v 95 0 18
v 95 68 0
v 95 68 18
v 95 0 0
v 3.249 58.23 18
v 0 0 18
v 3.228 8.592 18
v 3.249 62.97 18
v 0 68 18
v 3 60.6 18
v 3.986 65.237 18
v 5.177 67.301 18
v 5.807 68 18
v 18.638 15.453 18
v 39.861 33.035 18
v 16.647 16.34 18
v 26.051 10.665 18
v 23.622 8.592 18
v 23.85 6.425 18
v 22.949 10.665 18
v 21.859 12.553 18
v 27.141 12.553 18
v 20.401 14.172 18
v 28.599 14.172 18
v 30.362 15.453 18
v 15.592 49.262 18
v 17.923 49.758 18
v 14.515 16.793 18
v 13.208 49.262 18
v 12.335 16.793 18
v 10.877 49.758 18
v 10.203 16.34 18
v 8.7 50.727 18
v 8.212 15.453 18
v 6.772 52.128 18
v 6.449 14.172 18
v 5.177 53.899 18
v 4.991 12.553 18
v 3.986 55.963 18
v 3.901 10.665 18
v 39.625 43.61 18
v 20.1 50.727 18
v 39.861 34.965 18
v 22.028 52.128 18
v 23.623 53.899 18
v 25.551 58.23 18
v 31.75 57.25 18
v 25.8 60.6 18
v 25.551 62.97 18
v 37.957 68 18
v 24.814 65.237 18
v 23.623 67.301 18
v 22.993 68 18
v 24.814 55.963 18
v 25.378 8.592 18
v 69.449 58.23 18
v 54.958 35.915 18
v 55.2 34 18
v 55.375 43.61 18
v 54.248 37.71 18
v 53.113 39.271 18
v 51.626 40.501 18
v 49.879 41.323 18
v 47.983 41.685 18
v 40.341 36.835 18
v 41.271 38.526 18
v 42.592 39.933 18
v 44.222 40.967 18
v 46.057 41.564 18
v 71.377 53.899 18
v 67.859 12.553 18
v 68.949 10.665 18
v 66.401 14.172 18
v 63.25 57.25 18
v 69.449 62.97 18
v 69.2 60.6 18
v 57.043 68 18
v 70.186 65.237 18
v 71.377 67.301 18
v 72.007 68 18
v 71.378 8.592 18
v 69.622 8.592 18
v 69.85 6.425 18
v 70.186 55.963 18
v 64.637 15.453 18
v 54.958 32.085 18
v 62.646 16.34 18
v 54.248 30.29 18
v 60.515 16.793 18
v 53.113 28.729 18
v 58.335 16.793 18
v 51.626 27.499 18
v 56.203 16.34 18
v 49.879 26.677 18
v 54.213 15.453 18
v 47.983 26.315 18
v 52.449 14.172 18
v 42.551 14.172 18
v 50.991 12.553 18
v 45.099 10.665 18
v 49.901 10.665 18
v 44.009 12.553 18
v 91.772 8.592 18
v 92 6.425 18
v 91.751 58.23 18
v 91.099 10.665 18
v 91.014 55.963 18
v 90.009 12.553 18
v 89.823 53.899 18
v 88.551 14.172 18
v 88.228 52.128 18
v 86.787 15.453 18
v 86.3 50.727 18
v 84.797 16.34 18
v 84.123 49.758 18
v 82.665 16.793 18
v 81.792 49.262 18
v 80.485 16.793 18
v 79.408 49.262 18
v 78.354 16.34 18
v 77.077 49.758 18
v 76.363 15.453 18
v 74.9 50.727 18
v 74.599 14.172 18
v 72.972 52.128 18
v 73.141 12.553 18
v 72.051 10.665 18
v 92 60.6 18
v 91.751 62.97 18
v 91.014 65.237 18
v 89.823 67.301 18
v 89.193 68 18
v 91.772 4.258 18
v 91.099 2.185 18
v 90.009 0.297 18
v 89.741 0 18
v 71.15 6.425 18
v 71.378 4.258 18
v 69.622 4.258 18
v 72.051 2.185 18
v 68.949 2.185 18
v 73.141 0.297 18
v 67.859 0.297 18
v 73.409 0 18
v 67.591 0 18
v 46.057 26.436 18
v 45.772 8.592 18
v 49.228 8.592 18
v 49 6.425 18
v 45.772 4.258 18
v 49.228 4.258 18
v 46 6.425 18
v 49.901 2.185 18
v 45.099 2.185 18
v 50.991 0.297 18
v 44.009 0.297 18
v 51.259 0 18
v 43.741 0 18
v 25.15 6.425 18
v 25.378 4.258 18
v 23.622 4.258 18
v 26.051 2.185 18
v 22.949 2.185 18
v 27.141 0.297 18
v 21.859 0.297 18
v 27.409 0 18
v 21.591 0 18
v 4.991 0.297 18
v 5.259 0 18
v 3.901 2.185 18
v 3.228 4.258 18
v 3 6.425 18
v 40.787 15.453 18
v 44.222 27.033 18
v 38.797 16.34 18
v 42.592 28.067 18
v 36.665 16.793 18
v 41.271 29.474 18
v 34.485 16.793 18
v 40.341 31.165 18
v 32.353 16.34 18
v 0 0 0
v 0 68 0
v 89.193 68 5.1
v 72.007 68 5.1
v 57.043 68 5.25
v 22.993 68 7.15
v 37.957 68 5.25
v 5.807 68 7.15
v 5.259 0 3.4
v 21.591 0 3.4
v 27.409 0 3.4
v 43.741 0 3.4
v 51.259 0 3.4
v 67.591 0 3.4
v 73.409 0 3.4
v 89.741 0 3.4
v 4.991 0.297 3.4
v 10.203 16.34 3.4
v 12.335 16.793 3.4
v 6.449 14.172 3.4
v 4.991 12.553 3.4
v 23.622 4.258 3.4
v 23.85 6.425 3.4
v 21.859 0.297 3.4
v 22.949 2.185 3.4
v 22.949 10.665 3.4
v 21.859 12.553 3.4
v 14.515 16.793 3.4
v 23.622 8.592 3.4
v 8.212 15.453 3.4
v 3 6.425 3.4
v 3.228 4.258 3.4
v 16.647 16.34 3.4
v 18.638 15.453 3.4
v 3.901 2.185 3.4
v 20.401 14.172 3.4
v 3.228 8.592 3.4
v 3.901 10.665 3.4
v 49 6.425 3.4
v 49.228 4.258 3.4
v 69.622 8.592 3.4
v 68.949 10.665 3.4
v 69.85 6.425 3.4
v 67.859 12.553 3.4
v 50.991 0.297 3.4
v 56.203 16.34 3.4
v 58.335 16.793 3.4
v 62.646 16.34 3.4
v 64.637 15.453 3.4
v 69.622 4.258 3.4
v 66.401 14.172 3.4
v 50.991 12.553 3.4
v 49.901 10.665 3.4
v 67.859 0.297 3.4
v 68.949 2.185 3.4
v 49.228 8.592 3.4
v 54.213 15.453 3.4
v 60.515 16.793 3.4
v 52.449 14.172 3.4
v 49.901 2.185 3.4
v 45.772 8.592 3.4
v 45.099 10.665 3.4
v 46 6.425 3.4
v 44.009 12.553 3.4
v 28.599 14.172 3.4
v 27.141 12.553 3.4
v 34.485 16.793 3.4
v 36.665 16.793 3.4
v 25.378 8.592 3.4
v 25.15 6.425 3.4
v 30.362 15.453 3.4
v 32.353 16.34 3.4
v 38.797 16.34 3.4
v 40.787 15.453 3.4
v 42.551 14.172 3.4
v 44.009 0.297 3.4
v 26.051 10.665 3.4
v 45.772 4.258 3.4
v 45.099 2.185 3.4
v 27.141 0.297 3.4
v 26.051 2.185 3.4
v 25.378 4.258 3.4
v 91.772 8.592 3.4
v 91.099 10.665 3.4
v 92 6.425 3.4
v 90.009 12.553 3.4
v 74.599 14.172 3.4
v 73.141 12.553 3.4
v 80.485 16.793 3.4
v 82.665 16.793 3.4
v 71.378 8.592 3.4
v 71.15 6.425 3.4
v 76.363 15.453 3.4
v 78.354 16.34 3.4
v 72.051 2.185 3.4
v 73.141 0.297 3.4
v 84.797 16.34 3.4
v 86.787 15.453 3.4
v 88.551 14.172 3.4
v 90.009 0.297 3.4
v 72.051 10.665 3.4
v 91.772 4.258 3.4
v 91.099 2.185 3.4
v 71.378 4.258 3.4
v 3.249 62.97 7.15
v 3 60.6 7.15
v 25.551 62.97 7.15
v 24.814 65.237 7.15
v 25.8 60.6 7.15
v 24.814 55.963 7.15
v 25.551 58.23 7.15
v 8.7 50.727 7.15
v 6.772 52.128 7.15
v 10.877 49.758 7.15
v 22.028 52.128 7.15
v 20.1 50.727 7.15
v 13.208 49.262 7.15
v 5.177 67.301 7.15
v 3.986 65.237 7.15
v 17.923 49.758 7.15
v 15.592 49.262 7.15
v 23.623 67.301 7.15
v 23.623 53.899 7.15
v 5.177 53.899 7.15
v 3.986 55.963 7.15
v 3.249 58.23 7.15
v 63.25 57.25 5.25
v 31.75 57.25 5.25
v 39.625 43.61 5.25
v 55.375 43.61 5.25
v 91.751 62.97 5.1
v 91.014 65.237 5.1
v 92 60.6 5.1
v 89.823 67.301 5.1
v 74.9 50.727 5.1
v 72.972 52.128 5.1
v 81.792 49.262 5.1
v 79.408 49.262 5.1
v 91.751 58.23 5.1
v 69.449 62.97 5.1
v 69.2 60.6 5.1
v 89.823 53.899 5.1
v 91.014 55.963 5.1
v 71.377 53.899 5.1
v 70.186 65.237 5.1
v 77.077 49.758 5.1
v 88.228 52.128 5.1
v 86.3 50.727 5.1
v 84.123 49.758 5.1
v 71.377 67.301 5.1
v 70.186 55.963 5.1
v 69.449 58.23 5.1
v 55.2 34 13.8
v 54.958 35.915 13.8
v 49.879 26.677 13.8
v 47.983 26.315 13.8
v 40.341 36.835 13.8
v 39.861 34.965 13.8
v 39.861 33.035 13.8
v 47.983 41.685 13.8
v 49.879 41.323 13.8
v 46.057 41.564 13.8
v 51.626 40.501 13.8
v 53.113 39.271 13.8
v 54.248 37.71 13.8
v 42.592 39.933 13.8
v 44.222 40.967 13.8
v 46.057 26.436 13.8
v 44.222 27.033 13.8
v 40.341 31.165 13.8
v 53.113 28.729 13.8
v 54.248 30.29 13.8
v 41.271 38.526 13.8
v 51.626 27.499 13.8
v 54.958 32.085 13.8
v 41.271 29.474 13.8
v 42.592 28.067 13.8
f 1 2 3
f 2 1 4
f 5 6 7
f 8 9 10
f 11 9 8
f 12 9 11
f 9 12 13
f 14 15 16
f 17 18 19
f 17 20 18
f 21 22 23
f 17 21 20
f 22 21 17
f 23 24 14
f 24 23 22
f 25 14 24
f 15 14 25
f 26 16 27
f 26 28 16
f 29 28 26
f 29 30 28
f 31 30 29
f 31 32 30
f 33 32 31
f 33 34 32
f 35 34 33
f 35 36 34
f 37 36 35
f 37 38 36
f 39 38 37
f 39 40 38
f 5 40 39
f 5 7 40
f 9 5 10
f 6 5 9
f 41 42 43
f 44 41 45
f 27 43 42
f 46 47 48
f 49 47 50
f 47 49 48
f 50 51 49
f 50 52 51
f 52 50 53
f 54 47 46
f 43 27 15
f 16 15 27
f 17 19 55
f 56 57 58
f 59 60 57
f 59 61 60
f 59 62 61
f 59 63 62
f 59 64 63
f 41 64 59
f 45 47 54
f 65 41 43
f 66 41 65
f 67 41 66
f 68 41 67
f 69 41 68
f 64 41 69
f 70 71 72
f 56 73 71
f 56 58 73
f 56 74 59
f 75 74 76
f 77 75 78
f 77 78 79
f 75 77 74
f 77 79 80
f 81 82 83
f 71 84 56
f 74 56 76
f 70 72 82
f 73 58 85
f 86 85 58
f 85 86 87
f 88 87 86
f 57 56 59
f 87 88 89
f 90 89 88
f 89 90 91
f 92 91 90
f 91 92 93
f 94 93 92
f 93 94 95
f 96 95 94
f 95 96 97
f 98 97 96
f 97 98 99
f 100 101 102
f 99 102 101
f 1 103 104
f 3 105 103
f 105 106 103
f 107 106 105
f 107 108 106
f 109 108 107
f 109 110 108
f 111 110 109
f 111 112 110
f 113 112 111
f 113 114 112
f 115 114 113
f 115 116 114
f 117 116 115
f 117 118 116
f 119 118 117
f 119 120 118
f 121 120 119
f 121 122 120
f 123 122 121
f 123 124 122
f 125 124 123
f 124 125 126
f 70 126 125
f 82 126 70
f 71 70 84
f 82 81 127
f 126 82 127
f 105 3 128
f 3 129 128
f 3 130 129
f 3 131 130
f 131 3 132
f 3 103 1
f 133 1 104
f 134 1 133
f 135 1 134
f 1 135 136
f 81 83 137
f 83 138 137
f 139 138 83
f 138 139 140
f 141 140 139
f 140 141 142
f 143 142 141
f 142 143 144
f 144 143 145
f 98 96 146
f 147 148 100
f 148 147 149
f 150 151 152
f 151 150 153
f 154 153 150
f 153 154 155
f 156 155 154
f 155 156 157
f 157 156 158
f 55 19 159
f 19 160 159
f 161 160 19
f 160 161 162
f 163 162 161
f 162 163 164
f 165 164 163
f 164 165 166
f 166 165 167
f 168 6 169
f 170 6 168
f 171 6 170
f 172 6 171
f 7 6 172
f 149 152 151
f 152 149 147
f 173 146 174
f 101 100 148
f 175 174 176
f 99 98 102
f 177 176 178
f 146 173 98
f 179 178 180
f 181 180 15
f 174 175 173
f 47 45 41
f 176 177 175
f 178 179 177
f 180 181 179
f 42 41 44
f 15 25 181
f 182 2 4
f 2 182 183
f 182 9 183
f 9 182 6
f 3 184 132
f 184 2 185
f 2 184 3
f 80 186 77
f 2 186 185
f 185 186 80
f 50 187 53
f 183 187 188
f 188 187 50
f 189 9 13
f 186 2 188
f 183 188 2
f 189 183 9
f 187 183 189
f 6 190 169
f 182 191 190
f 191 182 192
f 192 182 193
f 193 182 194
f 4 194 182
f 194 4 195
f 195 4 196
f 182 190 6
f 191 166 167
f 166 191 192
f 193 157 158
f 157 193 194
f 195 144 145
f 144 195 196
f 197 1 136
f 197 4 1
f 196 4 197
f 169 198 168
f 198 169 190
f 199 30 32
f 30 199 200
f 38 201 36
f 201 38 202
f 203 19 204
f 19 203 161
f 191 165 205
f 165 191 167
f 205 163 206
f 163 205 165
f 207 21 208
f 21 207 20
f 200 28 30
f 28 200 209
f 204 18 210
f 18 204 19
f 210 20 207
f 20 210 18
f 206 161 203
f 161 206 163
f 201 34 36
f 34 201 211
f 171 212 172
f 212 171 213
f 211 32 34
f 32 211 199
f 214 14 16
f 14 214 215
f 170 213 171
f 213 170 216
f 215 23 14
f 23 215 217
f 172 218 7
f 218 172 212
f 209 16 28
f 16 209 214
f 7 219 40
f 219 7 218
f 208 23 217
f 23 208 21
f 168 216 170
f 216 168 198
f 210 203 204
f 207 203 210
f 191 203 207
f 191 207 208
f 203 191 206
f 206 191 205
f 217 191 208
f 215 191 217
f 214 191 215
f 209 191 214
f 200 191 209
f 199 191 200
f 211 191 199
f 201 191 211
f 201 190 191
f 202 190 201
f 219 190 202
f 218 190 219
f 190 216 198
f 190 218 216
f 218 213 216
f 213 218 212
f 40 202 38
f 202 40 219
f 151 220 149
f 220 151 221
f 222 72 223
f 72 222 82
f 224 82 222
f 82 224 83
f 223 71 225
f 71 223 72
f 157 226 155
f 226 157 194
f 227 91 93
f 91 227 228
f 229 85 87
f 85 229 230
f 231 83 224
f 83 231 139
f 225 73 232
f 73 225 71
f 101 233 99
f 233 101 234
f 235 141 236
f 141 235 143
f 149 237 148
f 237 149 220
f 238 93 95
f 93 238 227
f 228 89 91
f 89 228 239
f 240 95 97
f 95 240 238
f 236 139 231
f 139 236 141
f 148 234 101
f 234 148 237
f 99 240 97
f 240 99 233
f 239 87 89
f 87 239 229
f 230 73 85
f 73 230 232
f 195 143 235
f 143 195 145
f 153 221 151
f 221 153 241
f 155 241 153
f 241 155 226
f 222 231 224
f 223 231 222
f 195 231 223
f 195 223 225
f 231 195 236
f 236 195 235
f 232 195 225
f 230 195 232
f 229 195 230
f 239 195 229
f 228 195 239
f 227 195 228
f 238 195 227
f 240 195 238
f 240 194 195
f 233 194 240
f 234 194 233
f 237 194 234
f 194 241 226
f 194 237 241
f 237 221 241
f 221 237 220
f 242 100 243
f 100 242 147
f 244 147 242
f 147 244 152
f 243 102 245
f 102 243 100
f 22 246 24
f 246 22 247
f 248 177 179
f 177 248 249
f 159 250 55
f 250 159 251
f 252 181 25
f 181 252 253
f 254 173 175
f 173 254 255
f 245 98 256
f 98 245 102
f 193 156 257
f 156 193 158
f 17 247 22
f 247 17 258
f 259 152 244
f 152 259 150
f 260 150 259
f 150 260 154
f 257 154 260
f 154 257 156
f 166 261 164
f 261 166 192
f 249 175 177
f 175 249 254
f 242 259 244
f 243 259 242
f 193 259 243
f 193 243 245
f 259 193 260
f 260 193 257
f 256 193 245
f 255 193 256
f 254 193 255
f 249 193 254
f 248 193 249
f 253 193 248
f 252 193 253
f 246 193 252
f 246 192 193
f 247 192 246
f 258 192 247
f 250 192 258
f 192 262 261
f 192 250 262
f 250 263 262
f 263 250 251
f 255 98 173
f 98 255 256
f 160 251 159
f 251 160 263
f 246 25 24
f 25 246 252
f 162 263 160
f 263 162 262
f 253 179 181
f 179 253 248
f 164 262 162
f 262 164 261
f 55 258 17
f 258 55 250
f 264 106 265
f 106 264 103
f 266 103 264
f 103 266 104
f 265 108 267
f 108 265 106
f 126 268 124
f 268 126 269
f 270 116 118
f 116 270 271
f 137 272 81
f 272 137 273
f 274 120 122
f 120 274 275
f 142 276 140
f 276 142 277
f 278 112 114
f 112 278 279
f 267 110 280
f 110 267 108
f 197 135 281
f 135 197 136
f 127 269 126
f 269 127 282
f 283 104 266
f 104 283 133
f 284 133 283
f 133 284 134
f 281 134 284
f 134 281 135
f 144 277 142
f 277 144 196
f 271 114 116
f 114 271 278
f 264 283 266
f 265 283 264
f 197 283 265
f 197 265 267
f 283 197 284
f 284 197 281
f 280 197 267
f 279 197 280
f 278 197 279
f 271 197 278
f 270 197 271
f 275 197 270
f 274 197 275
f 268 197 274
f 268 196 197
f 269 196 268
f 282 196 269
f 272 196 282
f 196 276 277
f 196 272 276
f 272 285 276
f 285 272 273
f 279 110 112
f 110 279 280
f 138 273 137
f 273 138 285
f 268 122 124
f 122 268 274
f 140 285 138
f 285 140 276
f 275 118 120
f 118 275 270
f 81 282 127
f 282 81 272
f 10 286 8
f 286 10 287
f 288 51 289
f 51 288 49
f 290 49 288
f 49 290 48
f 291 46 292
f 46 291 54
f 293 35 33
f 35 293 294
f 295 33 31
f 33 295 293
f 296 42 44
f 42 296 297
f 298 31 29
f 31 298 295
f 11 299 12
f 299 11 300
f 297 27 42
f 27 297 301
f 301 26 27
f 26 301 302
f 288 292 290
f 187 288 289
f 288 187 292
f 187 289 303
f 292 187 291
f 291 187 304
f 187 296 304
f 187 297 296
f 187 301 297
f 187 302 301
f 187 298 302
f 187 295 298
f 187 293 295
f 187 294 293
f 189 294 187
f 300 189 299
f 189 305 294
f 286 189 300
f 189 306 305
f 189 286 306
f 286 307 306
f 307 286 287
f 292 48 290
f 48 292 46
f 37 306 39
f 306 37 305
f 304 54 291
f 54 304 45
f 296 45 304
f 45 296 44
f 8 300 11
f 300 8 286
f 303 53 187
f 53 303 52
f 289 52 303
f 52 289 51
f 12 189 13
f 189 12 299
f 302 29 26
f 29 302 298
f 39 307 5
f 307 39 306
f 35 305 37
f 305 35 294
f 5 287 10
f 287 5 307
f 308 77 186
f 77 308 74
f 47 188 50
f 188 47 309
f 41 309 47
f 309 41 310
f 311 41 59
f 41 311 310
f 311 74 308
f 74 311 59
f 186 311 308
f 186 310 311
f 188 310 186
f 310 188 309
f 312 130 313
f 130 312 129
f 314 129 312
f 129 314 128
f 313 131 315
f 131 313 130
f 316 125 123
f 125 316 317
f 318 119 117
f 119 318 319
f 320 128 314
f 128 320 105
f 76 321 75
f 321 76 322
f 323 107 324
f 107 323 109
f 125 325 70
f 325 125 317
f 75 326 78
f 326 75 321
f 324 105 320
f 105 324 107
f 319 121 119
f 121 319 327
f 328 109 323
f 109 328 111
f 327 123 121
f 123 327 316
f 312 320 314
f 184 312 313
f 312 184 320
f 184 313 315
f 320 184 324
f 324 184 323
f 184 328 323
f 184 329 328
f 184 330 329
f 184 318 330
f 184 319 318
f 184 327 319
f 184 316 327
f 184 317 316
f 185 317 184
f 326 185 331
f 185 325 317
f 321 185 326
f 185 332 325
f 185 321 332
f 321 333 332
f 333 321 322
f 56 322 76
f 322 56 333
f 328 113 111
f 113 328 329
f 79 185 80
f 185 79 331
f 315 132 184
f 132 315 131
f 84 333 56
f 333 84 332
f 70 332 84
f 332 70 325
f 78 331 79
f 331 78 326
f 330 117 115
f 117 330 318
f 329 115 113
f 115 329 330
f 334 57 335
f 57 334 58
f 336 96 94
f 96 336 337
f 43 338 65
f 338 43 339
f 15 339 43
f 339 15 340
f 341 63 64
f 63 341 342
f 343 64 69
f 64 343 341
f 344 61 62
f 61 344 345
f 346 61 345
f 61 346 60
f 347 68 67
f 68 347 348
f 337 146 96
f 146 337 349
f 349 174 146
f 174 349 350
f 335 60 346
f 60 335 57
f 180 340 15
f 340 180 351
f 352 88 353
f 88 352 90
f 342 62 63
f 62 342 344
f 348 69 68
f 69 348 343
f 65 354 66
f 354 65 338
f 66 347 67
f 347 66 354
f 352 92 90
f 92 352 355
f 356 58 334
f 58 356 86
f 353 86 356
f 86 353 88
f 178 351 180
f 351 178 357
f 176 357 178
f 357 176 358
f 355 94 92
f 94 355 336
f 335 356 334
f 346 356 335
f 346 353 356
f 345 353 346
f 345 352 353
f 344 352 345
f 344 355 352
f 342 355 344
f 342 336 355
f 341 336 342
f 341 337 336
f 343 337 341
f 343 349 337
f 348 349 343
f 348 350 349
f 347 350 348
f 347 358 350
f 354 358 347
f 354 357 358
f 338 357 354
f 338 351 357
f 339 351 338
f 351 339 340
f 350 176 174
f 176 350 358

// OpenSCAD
length = 95;
width = 68;
height = 18;

//Based on magnet size:
magnetBaseOuterDiameter = 20;
magnetBaseInnerDiameter = 15.4;
magnetHeight = 4.2;

minorSecretDiameter = 20.85;
minorSecretOffset = 4;
minorSecretHeight = 14.6;

majorSecretTokenDiameter = 22.8;
majorSecretTokenOffset = 4;
majorSecretTokenHeightOne = 12.9;
majorSecretTokenHeightTwo = 10.85;

artifactTokenDiameter = 31.5;
artifactTokenOffset = 5;
artifactTokenHeight = 12.75;

spaceBetweenCircles = 3;

difference(){
    cube([length, width, height]);

    translate([minorSecretDiameter/2 + spaceBetweenCircles, minorSecretDiameter/2 - minorSecretOffset, height - minorSecretHeight])
        cylinder(minorSecretHeight, d=minorSecretDiameter);

    translate([length /2 + (spaceBetweenCircles + minorSecretDiameter)/2, minorSecretDiameter/2 - minorSecretOffset, height - minorSecretHeight])
        cylinder(minorSecretHeight, d=minorSecretDiameter);
    translate([length /2 - (spaceBetweenCircles + minorSecretDiameter)/2, minorSecretDiameter/2 - minorSecretOffset, height - minorSecretHeight])
        cylinder(minorSecretHeight, d=minorSecretDiameter);
    
    translate([length - (minorSecretDiameter/2 + spaceBetweenCircles), minorSecretDiameter/2 - minorSecretOffset, height - minorSecretHeight])
        cylinder(minorSecretHeight, d=minorSecretDiameter);
    
    
    translate([majorSecretTokenDiameter/2 + spaceBetweenCircles, width - (majorSecretTokenDiameter/2 - majorSecretTokenOffset), height - majorSecretTokenHeightTwo])
        cylinder(majorSecretTokenHeightTwo, d=majorSecretTokenDiameter);

    translate([length /2, width - (artifactTokenDiameter/2 - artifactTokenOffset), height - artifactTokenHeight])
        cylinder(artifactTokenHeight, d=artifactTokenDiameter, $fn=6);
    
    translate([length - (majorSecretTokenDiameter/2 + spaceBetweenCircles), width - (majorSecretTokenDiameter/2 - majorSecretTokenOffset), height - majorSecretTokenHeightOne])
        cylinder(majorSecretTokenHeightOne, d=majorSecretTokenDiameter);
    

    translate([length/2, width/2, height - magnetHeight])
        cylinder(magnetHeight, d=magnetBaseInnerDiameter);
        

}
